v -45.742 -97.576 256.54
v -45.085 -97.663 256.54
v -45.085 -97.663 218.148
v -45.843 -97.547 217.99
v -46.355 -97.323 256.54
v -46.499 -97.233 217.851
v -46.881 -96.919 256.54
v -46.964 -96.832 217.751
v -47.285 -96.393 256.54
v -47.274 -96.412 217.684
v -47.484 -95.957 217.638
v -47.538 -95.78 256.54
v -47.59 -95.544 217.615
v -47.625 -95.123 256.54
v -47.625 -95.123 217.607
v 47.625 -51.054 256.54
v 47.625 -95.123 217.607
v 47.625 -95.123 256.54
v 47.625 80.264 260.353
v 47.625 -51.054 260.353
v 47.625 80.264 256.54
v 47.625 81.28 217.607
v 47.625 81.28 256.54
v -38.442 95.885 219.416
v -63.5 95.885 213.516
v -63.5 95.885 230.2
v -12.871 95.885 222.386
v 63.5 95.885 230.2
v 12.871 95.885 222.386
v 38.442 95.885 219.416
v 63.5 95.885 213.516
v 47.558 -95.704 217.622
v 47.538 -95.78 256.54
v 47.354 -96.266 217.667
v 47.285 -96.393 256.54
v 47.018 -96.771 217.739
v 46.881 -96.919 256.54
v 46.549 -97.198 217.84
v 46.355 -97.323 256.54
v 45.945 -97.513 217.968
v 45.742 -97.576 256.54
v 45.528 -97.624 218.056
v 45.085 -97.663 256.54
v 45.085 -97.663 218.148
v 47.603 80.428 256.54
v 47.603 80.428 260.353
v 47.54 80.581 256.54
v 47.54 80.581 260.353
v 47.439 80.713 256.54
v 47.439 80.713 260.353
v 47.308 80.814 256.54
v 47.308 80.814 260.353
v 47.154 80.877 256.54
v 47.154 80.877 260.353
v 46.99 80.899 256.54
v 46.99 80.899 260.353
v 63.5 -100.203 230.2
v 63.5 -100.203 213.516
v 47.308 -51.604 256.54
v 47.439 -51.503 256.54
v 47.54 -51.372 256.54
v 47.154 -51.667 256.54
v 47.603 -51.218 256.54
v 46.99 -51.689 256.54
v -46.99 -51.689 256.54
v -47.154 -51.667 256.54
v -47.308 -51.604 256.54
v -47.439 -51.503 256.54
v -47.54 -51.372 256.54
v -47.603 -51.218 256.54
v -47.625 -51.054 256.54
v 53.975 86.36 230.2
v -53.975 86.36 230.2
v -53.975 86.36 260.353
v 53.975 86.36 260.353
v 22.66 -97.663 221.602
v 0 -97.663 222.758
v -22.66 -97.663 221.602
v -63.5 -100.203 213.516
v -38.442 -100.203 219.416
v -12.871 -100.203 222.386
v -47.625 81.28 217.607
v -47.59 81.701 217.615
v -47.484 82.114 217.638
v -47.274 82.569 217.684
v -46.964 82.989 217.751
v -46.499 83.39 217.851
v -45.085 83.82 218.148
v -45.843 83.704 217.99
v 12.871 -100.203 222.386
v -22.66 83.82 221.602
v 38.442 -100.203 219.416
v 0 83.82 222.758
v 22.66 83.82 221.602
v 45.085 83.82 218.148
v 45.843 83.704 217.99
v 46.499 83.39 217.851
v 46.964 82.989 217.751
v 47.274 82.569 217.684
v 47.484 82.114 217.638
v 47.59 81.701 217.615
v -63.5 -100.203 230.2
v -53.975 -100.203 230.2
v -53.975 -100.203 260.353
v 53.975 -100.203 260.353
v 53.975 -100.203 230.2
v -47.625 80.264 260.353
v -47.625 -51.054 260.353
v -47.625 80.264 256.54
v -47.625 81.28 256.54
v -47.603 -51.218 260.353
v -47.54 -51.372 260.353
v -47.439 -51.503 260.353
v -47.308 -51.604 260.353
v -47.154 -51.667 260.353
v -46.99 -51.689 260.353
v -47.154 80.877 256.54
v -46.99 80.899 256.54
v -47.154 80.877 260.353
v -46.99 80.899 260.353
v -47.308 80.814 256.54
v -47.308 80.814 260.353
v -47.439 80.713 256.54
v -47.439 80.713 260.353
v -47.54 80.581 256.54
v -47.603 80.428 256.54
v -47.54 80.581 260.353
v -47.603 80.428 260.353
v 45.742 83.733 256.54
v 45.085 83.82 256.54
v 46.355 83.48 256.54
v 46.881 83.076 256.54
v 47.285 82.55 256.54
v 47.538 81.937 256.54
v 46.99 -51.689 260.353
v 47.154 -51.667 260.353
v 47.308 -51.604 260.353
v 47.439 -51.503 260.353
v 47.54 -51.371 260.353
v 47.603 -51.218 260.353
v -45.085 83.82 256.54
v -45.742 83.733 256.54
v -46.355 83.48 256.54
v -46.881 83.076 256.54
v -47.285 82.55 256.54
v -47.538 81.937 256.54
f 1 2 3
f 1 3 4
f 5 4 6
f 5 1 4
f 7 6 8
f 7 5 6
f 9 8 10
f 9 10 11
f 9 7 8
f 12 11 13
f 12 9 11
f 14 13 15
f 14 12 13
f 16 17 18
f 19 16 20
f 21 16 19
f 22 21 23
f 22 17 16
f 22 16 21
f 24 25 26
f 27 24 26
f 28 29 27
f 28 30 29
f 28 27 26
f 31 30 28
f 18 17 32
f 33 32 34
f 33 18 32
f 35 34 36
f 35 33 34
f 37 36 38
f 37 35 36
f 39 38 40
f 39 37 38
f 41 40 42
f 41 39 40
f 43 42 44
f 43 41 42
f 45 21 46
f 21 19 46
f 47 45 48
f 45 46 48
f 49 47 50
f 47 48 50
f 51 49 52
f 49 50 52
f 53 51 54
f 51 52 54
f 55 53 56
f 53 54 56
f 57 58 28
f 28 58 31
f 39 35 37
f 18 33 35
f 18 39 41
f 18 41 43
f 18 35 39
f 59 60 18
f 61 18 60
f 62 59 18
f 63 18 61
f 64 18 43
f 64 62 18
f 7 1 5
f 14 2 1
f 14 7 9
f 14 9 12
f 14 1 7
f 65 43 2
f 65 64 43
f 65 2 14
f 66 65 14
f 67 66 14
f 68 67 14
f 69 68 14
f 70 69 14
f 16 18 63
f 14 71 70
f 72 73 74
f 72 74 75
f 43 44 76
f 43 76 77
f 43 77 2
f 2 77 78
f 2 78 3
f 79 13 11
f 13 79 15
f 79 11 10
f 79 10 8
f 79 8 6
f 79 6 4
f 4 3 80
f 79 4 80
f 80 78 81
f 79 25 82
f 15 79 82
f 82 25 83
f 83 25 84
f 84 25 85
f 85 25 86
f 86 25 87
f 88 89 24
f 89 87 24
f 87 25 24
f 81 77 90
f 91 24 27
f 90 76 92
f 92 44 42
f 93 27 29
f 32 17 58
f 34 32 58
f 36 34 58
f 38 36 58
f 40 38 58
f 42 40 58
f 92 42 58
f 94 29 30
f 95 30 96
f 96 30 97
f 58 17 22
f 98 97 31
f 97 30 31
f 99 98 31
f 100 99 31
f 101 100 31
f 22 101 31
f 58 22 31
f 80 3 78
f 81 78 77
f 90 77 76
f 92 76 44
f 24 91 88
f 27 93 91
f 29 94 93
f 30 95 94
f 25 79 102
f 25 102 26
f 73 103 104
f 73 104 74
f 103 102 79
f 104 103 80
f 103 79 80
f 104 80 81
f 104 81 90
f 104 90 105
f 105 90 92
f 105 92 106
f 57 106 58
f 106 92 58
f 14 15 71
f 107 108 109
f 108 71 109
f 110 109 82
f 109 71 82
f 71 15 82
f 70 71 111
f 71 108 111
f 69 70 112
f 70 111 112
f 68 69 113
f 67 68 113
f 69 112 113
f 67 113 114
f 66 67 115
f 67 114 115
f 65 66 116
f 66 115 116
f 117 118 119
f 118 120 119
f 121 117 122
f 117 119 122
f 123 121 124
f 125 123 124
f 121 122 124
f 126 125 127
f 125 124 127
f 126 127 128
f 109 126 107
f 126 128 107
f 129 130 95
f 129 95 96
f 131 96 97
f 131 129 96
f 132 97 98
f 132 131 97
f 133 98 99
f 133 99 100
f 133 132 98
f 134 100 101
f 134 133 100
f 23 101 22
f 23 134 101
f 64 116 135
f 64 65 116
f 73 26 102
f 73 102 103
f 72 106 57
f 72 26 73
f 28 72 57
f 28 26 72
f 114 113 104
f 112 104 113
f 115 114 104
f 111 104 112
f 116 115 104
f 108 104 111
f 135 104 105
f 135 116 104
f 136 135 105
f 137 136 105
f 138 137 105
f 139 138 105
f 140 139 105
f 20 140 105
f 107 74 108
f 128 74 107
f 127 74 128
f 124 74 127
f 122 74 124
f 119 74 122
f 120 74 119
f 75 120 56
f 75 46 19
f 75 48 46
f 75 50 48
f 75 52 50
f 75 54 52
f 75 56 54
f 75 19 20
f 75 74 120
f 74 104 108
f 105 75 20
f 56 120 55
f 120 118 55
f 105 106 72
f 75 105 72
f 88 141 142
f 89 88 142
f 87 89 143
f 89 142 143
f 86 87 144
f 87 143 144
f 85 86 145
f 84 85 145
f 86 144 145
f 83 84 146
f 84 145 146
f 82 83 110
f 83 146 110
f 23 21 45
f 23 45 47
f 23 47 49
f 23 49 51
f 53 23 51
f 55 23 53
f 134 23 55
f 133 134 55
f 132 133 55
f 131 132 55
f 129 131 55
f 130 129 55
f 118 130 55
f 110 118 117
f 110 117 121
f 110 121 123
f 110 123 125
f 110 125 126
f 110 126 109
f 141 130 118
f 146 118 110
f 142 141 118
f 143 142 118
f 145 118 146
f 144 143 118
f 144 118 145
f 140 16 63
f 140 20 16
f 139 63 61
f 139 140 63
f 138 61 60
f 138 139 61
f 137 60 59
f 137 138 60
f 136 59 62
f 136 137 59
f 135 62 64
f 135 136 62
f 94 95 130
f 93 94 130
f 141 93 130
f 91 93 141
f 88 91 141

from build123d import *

# Parameters (mm, degrees)
SKETCH1_W           = 127
SKETCH1_H           = 196.088
EXTRUDE1_DEPTH      = 230.2002
SKETCH5_W           = 107.95
SKETCH5_H           = 186.563
EXTRUDE4_DEPTH      = 30.15234
EXTRUDE2_DEPTH      = 93.98
EXTRUDE2_DEPTH_BACK = 273.8502
SKETCH4_W           = 95.25
SKETCH4_H           = 132.588
SKETCH6_W           = 95.25
SKETCH6_H           = 45.974
SKETCH6_H_2         = 2.921
EXTRUDE5_DEPTH      = 256.54
FILLET1_R           = 2.54
SKETCH2_R           = 222.758
EXTRUDE3_DEPTH      = 202.86
FILLET2_R           = 0.635


with BuildPart() as part:
    # Sketch1 → Extrude1 (new body)
    with BuildSketch(Plane.XY):
        with Locations((0, -2.159)):
            Rectangle(SKETCH1_W, SKETCH1_H)
    extrude(amount=EXTRUDE1_DEPTH)

    # Sketch5 → Extrude4 (add)
    with BuildSketch(Plane.XY.offset(230.2002)):
        with Locations((0, -6.9215)):
            Rectangle(SKETCH5_W, SKETCH5_H)
    extrude(amount=EXTRUDE4_DEPTH)

    # Sketch4 → Extrude2 (cut, two sides: drawn at the far end of the back side and taken through both)
    with BuildSketch(Plane.XY.offset(230.2002).offset(-EXTRUDE2_DEPTH_BACK)):
        with Locations((0, 14.605)):
            Rectangle(SKETCH4_W, SKETCH4_H)
    extrude(amount=EXTRUDE2_DEPTH + EXTRUDE2_DEPTH_BACK, mode=Mode.SUBTRACT)

    # Sketch6 → Extrude5 (cut)
    with BuildSketch(Plane(origin=(0, 0, 0), x_dir=(-1, 0, 0), z_dir=(0, 0, -1))):
        with Locations((0, -74.676)):
            Rectangle(SKETCH6_W, SKETCH6_H)
        with Locations((0, 82.3595)):
            Rectangle(SKETCH6_W, SKETCH6_H_2)
    extrude(amount=-EXTRUDE5_DEPTH, mode=Mode.SUBTRACT)

    # Fillet1
    fillet1_edges = [part.edges().sort_by_distance(p)[0] for p in [
        (47.625, -97.663, 128.27),
        (-47.625, -97.663, 128.27),
        (47.625, 83.82, 128.27),
        (-47.625, 83.82, 128.27),
    ]]
    fillet(fillet1_edges, radius=FILLET1_R)

    # Sketch2 → Extrude3 (cut)
    with BuildSketch(Plane(origin=(0, 95.885, 0), x_dir=(-1, 0, 0), z_dir=(0, 1, 0))):
        Circle(SKETCH2_R)
    extrude(amount=-EXTRUDE3_DEPTH, mode=Mode.SUBTRACT)

    # Fillet2
    fillet2_edges = [part.edges().sort_by_distance(p)[0] for p in [
        (-47.625, 80.899, 258.44627),
        (-47.625, -51.689, 258.44627),
        (47.625, -51.689, 258.44627),
        (47.625, 80.899, 258.44627),
    ]]
    fillet(fillet2_edges, radius=FILLET2_R)


solid = part.part
